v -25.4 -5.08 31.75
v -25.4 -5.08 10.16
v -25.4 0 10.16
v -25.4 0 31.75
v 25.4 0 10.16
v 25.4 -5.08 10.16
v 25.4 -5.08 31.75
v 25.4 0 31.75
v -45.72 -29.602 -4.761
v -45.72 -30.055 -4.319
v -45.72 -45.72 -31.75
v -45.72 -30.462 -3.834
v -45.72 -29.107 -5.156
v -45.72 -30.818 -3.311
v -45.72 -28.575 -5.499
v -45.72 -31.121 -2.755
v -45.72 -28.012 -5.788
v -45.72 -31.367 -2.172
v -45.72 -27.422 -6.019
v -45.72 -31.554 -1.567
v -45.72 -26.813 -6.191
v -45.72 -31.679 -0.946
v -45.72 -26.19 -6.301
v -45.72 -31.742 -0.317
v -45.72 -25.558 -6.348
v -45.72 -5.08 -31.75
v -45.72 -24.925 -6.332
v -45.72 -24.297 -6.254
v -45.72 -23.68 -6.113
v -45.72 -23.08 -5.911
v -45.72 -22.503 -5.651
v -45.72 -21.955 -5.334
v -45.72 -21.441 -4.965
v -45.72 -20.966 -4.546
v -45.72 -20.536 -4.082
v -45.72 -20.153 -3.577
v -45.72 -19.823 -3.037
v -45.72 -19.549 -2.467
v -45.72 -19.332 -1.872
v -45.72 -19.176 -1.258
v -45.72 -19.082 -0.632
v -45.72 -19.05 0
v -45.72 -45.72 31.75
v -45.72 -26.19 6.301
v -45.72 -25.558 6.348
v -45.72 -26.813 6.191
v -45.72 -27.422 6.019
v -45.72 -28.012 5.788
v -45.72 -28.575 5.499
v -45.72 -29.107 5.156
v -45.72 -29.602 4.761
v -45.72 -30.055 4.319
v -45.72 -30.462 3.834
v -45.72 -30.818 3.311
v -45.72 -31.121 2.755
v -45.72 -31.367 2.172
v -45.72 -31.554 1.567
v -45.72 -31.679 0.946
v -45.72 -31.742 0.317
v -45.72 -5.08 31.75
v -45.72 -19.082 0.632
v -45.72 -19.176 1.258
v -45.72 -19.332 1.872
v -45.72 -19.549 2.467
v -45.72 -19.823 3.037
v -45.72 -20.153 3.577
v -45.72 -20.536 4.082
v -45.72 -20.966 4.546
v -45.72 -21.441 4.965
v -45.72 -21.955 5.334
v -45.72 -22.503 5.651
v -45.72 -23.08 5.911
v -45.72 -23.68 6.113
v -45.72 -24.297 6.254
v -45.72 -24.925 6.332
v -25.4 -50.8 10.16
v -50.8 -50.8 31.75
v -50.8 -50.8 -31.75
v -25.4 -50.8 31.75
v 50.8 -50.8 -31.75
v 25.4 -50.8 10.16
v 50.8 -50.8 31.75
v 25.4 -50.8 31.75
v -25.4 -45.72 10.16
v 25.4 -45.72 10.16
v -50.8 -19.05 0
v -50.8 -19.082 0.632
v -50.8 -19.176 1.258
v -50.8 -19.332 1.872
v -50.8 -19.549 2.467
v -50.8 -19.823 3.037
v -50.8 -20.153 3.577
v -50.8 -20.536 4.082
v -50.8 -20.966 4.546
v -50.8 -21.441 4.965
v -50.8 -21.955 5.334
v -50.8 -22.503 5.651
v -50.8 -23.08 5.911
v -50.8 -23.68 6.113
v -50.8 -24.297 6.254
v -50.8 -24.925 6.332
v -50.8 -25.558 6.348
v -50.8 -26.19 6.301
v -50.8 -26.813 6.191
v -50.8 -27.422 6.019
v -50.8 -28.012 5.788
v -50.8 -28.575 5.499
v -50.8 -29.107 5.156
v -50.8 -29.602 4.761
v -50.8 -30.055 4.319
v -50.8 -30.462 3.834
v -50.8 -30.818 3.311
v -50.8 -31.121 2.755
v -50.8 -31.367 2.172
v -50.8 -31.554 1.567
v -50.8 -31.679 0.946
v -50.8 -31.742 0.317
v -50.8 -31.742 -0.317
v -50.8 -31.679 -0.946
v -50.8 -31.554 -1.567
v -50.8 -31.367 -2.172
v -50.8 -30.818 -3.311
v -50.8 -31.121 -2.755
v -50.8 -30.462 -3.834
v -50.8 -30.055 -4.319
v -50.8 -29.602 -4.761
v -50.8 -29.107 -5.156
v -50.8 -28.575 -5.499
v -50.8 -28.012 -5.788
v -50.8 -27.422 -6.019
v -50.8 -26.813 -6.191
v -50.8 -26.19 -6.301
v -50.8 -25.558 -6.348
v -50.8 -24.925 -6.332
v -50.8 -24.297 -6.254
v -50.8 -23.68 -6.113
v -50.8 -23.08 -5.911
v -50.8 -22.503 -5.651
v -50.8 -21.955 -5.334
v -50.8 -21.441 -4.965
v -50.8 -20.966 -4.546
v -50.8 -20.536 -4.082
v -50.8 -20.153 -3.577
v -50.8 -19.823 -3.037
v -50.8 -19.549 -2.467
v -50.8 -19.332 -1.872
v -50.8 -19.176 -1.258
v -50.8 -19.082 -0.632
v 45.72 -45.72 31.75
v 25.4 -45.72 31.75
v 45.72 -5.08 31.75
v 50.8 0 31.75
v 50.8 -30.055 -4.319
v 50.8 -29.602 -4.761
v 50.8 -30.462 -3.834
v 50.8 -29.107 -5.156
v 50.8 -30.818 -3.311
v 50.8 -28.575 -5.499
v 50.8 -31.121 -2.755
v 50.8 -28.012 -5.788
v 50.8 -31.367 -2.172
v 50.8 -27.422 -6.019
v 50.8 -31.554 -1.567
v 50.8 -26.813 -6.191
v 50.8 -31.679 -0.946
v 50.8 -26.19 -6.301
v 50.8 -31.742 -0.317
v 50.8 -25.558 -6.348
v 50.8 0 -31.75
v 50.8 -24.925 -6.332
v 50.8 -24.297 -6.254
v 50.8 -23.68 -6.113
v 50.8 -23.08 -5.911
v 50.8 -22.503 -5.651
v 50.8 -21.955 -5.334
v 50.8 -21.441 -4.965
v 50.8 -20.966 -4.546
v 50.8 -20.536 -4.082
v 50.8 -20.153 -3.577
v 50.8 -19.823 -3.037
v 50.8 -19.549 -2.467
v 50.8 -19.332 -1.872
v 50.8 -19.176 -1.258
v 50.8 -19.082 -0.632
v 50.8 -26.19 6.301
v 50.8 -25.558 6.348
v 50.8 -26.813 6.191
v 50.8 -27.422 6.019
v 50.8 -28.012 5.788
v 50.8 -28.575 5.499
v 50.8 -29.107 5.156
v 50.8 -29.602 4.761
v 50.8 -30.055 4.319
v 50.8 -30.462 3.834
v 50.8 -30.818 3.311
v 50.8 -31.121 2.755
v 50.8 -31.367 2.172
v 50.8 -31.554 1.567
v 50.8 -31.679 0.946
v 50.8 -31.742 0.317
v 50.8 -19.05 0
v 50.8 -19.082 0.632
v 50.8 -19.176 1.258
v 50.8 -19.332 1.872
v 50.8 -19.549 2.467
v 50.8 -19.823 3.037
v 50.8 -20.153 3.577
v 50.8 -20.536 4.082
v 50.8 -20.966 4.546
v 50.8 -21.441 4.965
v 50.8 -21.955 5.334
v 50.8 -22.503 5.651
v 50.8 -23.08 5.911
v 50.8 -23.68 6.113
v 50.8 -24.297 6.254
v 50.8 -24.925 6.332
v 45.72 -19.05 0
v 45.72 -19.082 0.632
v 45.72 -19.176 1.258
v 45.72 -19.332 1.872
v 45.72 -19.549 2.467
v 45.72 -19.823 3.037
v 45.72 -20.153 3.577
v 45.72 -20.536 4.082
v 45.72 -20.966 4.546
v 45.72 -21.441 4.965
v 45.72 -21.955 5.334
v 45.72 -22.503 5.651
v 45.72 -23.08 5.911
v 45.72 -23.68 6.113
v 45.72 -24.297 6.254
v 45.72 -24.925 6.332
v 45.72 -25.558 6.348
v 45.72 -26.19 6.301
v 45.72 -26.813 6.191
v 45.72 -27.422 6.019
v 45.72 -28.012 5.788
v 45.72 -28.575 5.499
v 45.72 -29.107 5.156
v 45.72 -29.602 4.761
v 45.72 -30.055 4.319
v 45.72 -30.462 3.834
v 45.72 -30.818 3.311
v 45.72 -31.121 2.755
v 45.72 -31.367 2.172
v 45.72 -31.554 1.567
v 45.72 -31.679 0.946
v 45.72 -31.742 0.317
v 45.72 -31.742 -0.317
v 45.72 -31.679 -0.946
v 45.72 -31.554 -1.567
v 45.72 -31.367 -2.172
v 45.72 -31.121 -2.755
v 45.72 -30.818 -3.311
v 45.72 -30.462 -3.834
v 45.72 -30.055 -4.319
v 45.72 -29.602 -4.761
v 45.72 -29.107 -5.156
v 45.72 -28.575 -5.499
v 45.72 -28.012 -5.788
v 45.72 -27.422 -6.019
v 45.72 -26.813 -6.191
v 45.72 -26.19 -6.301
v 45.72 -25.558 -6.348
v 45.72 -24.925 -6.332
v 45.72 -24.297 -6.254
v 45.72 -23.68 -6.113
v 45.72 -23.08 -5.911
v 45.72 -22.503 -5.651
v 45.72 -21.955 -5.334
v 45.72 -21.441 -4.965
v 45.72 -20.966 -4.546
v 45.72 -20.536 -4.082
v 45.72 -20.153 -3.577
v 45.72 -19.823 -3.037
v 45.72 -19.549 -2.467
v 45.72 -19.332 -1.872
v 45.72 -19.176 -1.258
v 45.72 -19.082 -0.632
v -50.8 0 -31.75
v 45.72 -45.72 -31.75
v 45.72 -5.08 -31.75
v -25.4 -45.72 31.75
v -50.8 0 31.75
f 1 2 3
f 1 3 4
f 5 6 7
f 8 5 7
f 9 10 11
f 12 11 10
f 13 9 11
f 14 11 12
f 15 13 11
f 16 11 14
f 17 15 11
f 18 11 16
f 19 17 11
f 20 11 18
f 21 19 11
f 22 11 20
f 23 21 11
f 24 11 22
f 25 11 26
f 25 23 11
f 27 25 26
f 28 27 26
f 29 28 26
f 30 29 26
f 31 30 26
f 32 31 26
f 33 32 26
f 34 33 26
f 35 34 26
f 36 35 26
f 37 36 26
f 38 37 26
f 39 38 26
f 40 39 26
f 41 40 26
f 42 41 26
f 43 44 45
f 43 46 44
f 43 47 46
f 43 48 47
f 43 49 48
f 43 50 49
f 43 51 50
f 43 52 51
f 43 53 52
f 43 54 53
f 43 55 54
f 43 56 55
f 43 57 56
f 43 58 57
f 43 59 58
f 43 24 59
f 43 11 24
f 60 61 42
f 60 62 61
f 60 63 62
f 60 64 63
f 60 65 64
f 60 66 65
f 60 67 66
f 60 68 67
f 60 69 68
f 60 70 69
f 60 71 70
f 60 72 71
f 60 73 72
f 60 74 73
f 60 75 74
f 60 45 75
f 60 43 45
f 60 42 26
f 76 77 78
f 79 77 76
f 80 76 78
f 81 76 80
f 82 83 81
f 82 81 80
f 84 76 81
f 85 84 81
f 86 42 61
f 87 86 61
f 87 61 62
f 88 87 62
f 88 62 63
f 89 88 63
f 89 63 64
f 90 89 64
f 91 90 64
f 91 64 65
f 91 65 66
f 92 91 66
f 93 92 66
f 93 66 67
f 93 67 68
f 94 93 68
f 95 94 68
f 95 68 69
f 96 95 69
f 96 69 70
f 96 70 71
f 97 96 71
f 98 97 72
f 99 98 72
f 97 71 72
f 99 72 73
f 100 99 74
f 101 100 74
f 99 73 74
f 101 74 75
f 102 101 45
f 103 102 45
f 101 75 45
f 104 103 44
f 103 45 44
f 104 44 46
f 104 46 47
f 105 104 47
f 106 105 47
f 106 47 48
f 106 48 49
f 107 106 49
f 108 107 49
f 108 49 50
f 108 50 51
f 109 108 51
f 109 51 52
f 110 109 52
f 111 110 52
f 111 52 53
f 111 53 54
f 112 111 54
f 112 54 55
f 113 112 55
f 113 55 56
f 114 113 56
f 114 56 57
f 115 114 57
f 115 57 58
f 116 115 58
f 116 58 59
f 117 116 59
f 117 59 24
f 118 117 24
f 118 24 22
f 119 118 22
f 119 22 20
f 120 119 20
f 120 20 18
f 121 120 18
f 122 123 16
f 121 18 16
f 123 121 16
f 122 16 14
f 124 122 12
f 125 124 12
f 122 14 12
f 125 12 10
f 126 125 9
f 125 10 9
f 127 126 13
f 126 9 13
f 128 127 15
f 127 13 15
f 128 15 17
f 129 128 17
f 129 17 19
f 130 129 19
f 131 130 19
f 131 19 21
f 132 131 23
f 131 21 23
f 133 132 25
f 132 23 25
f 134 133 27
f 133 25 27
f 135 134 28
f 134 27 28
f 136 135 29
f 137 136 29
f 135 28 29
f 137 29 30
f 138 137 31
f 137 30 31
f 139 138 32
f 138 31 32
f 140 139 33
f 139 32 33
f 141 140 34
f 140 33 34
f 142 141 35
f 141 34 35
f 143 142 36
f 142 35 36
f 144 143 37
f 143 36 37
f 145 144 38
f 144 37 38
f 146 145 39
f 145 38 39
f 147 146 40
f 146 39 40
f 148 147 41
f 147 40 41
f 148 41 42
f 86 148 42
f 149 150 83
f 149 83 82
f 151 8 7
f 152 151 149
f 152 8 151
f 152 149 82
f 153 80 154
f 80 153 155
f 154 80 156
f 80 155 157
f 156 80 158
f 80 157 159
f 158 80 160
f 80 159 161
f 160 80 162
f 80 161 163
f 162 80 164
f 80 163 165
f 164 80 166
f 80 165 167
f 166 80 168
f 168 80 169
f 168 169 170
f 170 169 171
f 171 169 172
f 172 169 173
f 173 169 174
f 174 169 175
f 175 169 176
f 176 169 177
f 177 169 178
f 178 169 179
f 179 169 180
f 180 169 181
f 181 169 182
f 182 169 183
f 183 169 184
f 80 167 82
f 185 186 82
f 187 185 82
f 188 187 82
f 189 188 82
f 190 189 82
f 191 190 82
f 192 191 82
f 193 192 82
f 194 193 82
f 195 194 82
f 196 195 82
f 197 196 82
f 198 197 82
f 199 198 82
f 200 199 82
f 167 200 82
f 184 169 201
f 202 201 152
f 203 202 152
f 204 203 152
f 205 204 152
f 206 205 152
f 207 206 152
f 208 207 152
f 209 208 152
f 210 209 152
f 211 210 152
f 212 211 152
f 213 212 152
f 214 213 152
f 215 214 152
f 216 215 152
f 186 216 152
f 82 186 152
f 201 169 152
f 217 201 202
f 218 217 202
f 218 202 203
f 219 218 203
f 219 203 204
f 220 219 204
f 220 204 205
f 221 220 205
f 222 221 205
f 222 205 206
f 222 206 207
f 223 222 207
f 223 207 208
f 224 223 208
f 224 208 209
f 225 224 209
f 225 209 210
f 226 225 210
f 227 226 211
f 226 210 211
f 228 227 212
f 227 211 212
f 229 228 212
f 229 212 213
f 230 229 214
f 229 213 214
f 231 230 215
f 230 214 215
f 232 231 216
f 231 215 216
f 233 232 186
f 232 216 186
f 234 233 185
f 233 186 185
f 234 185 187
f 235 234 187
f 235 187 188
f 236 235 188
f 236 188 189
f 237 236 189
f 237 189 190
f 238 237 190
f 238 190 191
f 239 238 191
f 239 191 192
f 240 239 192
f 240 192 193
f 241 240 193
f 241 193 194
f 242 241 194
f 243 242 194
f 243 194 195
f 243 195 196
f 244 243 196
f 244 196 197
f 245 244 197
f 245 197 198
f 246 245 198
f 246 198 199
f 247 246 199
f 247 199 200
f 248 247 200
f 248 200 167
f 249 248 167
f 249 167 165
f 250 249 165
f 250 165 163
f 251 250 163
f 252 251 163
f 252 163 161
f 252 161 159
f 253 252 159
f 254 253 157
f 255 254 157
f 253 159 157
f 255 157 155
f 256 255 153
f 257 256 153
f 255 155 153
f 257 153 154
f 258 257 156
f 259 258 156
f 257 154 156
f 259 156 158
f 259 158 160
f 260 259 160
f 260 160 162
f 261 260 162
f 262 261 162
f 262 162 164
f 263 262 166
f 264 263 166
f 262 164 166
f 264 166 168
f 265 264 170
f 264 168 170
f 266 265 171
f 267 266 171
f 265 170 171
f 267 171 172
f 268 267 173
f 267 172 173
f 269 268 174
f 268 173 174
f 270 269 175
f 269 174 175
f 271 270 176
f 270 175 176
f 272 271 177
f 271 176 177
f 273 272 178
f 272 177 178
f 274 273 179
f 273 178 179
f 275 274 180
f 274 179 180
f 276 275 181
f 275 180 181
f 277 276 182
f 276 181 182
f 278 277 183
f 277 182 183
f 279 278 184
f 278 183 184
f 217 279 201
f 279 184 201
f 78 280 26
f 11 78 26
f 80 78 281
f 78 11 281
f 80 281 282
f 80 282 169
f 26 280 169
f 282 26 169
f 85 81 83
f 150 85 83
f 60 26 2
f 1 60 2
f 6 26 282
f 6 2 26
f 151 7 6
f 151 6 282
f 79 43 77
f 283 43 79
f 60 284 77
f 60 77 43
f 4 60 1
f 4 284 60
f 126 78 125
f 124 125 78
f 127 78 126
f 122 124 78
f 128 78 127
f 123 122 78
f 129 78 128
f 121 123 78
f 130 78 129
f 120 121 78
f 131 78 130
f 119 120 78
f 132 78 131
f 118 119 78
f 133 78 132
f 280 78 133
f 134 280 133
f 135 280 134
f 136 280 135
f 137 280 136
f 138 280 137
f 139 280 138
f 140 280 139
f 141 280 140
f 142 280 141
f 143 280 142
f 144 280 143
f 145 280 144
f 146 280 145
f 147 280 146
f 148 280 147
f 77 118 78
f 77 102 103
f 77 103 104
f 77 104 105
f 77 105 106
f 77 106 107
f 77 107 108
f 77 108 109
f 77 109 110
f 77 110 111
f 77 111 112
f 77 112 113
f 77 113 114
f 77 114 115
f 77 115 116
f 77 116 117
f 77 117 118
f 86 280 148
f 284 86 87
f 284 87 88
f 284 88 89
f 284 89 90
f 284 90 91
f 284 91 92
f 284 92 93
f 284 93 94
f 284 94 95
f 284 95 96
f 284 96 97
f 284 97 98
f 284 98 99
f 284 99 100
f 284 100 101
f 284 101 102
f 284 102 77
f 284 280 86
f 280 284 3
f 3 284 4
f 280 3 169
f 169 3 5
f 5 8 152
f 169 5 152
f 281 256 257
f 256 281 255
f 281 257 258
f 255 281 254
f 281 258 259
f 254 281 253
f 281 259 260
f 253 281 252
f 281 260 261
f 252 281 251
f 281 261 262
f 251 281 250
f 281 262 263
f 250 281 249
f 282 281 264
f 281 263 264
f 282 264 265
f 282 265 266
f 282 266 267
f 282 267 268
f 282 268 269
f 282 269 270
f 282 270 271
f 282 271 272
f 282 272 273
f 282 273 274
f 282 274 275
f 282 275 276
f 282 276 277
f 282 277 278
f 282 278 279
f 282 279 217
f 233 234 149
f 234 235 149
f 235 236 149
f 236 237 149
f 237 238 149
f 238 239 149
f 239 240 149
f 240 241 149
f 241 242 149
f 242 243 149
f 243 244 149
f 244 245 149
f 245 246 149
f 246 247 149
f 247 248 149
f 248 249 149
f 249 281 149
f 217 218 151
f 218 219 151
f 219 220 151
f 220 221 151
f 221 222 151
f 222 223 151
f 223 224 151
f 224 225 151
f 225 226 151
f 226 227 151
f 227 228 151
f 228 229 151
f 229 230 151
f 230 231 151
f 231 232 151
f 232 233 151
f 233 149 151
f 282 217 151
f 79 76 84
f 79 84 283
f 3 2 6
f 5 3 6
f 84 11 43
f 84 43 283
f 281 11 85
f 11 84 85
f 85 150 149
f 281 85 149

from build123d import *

# Parameters (mm, degrees)
F0_W     = 101.6
F0_H     = 63.5
F1_DEPTH = 50.8
F2_W     = 50.8
F2_H     = 21.59
F3_DEPTH = 70.866
F4_W     = 91.44
F4_H     = 40.64
F5_DEPTH = 71.628
F6_R     = 6.35
F7_DEPTH = 111.506


with BuildPart() as f1:
    # F0 (on Front) → F1 (new body)
    with BuildSketch(Plane.XZ):
        Rectangle(F0_W, F0_H)
    extrude(amount=F1_DEPTH)

    # F2 (on face) → F3 (cut)
    with BuildSketch(Plane.XZ.offset(50.8)):
        with Locations((0, 20.955)):
            Rectangle(F2_W, F2_H)
    extrude(amount=-F3_DEPTH, mode=Mode.SUBTRACT)

    # F4 (on face) → F5 (cut)
    with BuildSketch(Plane.XY.offset(31.75)):
        with Locations((0, -25.4)):
            Rectangle(F4_W, F4_H)
    extrude(amount=-F5_DEPTH, mode=Mode.SUBTRACT)

    # F6 (on face) → F7 (cut)
    with BuildSketch(Plane.YZ.offset(50.8)):
        with Locations((-25.4, 0)):
            Circle(F6_R)
    extrude(amount=-F7_DEPTH, mode=Mode.SUBTRACT)


solid = f1.part
